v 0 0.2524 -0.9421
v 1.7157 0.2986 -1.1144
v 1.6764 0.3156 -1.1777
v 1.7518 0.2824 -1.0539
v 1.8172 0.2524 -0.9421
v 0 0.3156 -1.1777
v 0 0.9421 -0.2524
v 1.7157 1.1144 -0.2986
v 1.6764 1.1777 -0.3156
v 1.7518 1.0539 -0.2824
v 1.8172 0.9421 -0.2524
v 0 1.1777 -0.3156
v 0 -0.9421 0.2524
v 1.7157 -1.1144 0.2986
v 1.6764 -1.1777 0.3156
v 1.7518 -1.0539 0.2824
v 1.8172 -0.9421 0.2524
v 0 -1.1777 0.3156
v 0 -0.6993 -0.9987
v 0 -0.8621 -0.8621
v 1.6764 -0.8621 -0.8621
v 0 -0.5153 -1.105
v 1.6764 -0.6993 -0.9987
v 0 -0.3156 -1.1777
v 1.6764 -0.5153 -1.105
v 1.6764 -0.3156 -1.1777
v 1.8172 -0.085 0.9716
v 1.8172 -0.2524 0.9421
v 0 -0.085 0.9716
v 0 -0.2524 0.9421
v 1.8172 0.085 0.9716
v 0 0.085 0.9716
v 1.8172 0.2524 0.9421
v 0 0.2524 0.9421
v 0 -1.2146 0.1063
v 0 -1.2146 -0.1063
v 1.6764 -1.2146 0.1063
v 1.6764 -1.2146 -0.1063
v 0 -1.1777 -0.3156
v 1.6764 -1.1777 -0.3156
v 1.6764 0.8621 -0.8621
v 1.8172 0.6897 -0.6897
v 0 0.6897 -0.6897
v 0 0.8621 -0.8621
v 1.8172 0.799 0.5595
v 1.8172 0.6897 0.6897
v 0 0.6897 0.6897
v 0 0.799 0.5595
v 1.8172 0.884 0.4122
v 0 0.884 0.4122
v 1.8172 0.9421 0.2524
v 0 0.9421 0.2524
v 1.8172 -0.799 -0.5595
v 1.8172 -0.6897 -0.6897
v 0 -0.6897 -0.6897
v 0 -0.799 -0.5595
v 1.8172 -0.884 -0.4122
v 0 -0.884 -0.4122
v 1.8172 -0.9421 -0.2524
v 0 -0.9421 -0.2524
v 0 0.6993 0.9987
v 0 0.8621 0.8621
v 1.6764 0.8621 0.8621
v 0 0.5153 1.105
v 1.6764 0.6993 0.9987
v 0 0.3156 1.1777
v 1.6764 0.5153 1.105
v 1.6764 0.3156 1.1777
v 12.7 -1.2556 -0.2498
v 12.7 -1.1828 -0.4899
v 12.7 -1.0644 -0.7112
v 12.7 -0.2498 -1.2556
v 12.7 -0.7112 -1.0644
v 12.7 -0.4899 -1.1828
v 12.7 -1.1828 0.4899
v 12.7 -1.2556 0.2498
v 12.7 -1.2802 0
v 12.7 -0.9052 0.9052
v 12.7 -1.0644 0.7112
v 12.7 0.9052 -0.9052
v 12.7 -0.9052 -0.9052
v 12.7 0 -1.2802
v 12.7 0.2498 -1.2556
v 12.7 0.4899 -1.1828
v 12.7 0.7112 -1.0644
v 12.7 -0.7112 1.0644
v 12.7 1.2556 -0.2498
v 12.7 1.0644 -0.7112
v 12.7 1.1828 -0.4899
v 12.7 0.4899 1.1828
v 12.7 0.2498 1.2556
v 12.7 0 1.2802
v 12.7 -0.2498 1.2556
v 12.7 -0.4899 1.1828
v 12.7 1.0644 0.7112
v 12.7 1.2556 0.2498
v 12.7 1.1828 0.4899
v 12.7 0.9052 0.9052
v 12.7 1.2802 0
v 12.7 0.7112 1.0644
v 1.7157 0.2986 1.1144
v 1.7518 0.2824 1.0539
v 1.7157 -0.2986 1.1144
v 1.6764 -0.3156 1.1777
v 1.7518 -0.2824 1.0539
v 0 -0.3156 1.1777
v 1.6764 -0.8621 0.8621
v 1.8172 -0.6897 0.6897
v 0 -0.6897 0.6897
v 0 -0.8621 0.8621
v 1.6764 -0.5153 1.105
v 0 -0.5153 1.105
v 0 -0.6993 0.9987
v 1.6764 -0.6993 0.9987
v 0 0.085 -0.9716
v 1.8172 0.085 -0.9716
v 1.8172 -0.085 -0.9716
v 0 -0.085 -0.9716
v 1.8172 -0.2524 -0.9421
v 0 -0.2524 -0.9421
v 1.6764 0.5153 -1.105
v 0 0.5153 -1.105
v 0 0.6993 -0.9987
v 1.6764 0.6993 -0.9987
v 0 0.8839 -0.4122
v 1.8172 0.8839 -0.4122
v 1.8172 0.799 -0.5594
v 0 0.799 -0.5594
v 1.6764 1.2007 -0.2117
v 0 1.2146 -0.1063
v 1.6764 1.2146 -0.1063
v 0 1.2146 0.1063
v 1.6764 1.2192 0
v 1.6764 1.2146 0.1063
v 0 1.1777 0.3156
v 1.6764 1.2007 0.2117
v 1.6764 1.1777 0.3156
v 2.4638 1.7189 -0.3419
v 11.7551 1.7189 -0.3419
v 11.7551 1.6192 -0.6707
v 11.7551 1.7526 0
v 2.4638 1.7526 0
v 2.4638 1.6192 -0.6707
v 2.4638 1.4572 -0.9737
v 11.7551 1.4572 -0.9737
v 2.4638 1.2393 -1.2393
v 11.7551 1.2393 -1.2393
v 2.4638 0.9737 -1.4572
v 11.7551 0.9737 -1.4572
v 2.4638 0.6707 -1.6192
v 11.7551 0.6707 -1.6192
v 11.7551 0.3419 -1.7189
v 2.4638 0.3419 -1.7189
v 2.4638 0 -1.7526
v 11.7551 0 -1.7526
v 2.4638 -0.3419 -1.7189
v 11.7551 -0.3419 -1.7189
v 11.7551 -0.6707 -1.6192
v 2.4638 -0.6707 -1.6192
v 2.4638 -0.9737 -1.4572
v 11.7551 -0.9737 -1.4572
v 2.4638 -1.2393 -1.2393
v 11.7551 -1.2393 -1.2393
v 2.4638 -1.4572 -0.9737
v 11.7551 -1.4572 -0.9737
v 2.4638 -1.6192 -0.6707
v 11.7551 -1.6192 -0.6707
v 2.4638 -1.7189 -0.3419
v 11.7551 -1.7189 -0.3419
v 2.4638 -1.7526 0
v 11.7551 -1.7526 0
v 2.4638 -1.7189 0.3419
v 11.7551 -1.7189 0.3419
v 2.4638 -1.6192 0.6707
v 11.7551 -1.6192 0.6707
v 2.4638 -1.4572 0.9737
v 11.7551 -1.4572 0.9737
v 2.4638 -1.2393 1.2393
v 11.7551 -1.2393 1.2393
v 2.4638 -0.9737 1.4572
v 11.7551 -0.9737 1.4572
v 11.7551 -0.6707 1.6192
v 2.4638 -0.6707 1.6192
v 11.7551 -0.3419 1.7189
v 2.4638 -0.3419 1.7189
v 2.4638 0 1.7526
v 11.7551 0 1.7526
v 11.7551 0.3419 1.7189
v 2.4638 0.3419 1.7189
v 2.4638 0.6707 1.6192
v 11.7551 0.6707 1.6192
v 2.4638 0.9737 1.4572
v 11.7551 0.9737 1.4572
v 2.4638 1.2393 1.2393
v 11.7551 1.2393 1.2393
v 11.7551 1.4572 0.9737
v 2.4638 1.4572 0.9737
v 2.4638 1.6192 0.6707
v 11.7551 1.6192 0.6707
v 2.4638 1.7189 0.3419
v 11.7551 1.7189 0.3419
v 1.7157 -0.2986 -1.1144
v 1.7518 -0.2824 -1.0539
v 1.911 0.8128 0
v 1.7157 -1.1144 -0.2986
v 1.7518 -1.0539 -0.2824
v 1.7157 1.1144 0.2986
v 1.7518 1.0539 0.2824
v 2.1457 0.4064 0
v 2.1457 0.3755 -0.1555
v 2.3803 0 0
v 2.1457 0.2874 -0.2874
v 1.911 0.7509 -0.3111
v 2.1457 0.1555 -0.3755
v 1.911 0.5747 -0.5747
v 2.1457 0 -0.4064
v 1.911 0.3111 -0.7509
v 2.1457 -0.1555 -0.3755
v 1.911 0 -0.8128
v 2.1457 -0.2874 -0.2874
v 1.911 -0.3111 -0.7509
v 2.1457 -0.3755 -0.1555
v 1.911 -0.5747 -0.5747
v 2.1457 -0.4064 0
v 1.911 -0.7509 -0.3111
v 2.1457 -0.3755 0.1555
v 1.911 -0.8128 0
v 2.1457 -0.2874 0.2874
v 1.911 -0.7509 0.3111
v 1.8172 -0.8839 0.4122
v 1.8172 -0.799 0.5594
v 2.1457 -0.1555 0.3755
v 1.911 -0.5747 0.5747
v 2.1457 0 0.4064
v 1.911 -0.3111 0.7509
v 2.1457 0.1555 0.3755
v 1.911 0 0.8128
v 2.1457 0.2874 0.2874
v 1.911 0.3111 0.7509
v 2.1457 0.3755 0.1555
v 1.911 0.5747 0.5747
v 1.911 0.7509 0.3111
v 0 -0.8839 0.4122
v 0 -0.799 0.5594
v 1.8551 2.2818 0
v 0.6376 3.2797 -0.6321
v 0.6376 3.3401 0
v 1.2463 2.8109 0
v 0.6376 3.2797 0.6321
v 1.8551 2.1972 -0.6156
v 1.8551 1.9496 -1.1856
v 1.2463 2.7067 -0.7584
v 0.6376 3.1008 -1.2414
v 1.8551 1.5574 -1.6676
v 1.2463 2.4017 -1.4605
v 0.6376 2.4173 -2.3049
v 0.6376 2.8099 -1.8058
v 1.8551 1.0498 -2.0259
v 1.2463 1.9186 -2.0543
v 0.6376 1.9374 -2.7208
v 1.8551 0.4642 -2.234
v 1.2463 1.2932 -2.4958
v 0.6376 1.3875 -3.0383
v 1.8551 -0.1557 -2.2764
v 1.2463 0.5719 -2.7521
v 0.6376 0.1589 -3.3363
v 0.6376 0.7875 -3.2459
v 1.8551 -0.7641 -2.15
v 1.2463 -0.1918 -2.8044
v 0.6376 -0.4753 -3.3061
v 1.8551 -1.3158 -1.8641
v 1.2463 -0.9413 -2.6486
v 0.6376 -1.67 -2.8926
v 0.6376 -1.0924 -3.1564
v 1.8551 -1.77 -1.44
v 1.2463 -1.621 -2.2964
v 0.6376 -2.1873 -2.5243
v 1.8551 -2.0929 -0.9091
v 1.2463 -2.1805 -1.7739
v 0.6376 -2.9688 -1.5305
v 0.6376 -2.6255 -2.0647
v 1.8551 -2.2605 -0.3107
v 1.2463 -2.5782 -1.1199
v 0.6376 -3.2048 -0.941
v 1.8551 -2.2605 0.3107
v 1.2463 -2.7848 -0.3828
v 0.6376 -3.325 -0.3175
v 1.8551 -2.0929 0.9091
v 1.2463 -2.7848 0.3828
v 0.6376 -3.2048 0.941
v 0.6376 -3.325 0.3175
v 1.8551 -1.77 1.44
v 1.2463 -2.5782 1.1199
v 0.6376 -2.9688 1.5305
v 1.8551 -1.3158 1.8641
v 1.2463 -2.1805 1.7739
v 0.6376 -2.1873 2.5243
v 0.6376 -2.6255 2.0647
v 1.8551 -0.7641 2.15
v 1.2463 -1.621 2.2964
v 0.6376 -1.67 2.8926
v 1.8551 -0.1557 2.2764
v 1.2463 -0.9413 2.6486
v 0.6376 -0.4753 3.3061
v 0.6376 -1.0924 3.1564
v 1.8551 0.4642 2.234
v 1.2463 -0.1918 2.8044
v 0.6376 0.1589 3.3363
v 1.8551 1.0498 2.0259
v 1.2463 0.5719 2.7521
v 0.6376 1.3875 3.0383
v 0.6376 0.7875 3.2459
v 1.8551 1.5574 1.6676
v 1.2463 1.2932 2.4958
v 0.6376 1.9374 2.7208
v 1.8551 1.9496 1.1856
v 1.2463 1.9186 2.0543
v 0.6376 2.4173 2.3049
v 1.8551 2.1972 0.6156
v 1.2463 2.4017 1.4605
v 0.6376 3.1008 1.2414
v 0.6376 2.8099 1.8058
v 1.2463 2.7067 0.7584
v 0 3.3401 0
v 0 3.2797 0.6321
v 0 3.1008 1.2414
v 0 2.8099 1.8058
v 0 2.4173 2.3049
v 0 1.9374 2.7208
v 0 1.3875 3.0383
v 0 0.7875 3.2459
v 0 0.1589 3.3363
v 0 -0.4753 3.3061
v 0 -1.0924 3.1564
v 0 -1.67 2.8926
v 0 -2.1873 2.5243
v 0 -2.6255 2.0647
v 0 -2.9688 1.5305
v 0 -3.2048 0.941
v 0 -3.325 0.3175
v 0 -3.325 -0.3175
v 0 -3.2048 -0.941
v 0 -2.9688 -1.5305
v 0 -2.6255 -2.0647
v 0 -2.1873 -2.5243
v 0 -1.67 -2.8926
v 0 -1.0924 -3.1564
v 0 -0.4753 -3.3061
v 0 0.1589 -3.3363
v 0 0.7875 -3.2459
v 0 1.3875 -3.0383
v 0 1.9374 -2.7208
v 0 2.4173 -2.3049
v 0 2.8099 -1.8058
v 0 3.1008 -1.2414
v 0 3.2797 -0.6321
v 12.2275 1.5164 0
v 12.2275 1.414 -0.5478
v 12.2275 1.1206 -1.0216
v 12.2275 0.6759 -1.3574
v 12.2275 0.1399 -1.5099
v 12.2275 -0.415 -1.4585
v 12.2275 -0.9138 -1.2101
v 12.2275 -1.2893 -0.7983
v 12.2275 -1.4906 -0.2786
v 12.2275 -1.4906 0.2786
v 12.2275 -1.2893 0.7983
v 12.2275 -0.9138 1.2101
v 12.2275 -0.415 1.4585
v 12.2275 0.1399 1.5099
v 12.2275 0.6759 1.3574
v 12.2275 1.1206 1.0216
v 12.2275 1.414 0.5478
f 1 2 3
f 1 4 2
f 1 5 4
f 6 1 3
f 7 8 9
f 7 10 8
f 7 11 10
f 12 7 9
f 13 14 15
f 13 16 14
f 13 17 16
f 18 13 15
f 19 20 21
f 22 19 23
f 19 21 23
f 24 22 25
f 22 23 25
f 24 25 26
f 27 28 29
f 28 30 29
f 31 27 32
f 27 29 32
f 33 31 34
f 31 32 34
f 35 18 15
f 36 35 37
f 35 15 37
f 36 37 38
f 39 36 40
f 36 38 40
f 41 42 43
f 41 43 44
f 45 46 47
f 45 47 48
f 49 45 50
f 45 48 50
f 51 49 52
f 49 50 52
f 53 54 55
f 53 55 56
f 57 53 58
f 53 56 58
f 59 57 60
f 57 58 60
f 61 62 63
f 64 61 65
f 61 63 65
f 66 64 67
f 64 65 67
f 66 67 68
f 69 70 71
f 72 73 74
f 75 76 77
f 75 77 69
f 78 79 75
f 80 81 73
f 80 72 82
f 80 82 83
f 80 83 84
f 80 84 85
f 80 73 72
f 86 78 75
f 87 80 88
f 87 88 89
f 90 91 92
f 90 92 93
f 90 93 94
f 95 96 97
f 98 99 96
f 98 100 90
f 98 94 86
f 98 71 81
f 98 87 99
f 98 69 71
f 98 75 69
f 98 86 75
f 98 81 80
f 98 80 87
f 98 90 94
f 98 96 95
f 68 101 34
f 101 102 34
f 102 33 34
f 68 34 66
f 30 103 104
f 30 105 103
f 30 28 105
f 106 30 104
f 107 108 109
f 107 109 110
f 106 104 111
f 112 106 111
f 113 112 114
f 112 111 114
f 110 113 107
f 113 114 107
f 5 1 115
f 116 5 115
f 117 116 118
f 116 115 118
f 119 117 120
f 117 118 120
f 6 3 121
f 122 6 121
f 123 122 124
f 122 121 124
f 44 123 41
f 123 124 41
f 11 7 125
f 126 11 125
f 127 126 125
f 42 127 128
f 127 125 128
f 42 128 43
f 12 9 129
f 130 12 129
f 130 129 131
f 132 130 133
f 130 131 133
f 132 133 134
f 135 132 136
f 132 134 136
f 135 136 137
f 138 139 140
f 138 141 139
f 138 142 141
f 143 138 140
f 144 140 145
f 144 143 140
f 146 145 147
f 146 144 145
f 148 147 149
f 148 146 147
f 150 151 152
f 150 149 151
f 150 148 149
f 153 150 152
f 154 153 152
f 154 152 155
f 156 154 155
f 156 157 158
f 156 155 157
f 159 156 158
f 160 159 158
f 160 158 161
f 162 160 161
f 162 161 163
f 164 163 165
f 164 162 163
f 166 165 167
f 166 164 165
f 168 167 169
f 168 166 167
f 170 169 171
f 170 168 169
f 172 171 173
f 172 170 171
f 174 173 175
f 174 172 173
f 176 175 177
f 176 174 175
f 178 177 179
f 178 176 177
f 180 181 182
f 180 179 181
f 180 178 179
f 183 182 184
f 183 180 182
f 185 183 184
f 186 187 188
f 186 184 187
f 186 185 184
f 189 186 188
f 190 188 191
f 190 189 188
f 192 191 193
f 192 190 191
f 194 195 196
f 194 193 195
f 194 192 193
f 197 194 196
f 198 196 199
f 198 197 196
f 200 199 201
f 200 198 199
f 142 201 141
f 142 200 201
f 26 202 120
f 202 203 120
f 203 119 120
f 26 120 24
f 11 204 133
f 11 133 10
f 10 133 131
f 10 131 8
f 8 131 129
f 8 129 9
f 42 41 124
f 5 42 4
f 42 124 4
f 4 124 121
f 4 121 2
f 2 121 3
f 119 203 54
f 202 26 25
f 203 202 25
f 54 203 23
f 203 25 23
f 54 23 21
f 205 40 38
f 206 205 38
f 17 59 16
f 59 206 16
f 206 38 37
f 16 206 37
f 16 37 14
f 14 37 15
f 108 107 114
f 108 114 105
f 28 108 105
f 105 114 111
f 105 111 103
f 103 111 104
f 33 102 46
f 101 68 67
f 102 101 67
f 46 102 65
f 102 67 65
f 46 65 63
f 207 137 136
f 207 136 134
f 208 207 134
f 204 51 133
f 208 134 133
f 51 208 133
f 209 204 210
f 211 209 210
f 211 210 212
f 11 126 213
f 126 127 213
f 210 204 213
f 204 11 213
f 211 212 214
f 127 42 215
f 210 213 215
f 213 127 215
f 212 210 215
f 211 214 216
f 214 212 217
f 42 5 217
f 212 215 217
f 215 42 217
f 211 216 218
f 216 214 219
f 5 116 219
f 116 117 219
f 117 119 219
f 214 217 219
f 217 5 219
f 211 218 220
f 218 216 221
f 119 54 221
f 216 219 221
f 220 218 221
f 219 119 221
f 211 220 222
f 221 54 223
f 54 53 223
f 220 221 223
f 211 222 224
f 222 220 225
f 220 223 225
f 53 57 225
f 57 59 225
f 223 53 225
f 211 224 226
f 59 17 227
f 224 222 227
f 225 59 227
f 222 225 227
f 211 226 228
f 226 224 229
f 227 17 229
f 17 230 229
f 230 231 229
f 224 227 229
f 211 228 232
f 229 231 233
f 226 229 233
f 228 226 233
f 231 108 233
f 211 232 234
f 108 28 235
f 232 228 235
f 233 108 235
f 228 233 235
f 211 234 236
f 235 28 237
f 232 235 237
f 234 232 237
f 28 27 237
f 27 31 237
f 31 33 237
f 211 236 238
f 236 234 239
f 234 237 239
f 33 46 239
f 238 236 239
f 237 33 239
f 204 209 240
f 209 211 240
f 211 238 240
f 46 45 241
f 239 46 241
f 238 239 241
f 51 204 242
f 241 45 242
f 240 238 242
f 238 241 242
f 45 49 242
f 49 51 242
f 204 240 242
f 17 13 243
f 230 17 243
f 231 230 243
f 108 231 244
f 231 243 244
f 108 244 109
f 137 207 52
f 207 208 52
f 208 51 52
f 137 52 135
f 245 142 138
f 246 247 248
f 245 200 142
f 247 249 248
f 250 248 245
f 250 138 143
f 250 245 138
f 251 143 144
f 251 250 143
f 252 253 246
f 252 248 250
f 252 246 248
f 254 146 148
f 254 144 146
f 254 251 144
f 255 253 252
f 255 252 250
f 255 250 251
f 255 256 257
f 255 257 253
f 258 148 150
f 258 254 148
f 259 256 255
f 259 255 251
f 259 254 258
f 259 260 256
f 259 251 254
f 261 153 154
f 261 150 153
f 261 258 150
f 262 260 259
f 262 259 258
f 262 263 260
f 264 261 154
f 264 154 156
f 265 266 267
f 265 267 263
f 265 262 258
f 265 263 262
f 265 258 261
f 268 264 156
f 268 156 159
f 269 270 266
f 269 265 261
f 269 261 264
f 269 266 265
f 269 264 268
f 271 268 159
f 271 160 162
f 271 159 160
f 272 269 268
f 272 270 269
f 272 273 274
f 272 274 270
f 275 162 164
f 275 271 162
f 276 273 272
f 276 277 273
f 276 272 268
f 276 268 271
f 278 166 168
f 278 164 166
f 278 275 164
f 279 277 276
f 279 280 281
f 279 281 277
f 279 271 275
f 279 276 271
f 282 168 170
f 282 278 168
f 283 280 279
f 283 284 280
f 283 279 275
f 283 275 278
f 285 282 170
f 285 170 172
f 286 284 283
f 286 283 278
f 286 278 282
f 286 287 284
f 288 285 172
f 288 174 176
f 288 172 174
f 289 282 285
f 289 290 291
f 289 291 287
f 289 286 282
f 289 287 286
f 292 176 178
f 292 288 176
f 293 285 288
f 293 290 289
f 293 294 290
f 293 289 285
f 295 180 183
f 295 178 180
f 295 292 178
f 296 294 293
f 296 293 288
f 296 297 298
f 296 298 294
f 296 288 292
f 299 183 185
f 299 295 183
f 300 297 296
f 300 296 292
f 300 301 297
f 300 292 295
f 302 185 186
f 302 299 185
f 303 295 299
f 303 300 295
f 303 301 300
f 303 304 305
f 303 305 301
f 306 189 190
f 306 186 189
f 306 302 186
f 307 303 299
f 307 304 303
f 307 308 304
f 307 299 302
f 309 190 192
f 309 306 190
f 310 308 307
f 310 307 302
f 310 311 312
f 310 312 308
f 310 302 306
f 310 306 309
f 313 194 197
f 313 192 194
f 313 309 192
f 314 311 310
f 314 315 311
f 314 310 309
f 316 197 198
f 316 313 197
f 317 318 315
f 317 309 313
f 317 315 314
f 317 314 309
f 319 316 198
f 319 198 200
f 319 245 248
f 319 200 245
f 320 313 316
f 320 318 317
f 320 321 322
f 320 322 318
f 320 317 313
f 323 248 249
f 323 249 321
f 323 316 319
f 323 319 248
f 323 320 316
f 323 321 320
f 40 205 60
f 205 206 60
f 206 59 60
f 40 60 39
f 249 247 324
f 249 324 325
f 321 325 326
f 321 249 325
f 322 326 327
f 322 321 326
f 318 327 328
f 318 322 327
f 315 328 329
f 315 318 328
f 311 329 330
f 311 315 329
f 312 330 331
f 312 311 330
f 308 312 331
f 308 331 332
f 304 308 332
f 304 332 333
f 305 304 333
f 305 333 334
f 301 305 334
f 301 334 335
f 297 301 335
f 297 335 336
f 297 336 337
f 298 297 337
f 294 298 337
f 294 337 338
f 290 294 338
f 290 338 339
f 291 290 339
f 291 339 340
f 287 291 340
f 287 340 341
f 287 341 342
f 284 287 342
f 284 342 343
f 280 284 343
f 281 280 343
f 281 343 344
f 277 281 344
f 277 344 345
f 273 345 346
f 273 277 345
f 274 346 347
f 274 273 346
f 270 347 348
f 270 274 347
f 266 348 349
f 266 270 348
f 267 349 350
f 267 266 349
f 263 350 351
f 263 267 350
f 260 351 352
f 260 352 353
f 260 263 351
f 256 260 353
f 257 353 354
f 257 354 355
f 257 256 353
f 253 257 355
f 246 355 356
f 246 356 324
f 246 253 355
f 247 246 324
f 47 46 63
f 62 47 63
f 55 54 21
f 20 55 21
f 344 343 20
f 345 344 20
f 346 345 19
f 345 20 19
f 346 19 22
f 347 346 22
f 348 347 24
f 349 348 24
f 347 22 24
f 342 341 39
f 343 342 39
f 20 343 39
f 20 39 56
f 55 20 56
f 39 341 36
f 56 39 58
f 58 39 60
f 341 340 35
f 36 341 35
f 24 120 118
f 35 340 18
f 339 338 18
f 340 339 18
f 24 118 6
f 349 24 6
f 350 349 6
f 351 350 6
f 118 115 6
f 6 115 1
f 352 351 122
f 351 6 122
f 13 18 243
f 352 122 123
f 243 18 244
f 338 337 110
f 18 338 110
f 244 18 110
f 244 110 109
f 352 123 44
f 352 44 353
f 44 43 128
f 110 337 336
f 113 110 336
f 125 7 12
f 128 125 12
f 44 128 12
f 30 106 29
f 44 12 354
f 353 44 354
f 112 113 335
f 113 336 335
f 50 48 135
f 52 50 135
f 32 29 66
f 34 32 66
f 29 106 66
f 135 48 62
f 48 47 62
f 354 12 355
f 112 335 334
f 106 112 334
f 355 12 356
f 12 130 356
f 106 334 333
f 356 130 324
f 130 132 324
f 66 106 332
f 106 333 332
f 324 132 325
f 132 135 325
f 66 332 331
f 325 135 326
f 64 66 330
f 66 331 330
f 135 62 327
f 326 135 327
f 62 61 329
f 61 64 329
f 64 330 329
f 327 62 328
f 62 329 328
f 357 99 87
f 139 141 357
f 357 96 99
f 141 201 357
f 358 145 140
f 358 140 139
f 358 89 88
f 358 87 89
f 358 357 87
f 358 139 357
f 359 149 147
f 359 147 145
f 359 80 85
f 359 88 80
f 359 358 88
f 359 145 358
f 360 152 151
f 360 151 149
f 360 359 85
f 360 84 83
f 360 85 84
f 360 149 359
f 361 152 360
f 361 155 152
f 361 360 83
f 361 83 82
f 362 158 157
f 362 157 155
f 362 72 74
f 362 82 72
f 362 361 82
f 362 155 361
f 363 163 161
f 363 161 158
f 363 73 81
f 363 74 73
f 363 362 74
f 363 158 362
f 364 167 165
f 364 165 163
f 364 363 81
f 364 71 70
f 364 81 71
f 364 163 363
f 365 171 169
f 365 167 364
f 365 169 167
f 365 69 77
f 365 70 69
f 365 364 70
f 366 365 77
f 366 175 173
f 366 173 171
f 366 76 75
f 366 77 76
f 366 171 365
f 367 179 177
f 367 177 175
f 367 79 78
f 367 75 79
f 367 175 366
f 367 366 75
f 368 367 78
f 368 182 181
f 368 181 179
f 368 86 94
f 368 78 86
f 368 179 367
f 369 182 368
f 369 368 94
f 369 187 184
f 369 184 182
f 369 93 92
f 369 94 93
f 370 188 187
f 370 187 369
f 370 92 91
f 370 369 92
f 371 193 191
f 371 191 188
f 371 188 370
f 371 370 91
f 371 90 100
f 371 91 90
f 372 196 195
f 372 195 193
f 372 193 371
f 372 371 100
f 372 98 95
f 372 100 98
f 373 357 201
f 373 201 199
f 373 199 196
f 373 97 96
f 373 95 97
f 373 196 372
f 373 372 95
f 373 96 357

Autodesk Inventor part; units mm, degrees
ref_plane "YZ Plane" through (0, 0, 0) normal (1, 0, 0) x (0, 1, 0)
ref_plane "XZ Plane" through (0, 0, 0) normal (0, 1, 0) x (-1, 0, 0)
sketch "Sketch1" plane through (0, 0, 0) normal (0, 0, 1) x (1, 0, 0)
  line L0 (12.7, 0) -> (12.7, 1.7526)
  line L1 (12.7, 1.7526) -> (2.4638, 1.7526)
  line L2 (0, 3.3401) -> (0, 1.2192)
  line L3 (0, 1.2192) -> (1.6764, 1.2192)
  line L4 (1.6764, 1.2192) -> (2.3803, 0)
  line L5 (2.3803, 0) -> (12.7, 0)
  line L6 (0, 3.3401) -> (0.6376, 3.3401)
  line L7 (0.6376, 3.3401) -> (2.4638, 1.7526)
  line L8 (-2.54, 0) -> (15.24, 0) projected
  line L9 (0, -0.668) -> (0, 4.0081) projected
  dimension "d0" = 12.7
  dimension "d1" = 1.6764
  dimension "d2" = 3.5052
  dimension "d3" = 2.4638
  dimension "d4" = 41
  dimension "d5" = 2.4384
  dimension "d6" = 60
  dimension "d7" = 6.6802
revolve "Body" add sketch "Sketch1" angle 360 about axis through (2.3803, 0, 0) along (1, 0, 0) contours L5 L4 L3 L2 L6 L7 L1 L0
sketch "Sketch2" plane through (0, 0, 0) normal (-1, 0, 0) x (0, 0, 1)
  circle A0 centre (0, 0) radius 3.3401 projected
  circle A1 centre (0, 0) radius 1.2192 projected
  line L0 (0.9421, 0.2524) -> (1.1777, 0.3156)
  line L1 (0.9421, -0.2524) -> (1.1777, -0.3156)
  arc A2 (0.9421, -0.2524) -> (0.9421, 0.2524) centre (0, 0) ccw
  arc A3 (1.1777, -0.3156) -> (1.1777, 0.3156) centre (0, 0) ccw
  line L2 (0, -4.6761) -> (0, 4.6761) projected
  line L3 (-4.6761, 0) -> (4.6761, 0) projected
  line L4 (0.9421, 0.2524) -> (0, 0) construction
  line L5 (0, 0) -> (0.9421, -0.2524) construction
  line L6 (0.2524, 0.9421) -> (0.3156, 1.1777)
  line L7 (0.6897, 0.6897) -> (0.8621, 0.8621)
  arc A4 (0.6897, 0.6897) -> (0.2524, 0.9421) centre (0, 0) ccw
  arc A5 (0.8621, 0.8621) -> (0.3156, 1.1777) centre (0, 0) ccw
  line L8 (-0.6897, 0.6897) -> (-0.8621, 0.8621)
  line L9 (-0.2524, 0.9421) -> (-0.3156, 1.1777)
  arc A6 (-0.2524, 0.9421) -> (-0.6897, 0.6897) centre (0, 0) ccw
  arc A7 (-0.3156, 1.1777) -> (-0.8621, 0.8621) centre (0, 0) ccw
  line L10 (-0.9421, -0.2524) -> (-1.1777, -0.3156)
  line L11 (-0.9421, 0.2524) -> (-1.1777, 0.3156)
  arc A8 (-0.9421, 0.2524) -> (-0.9421, -0.2524) centre (0, 0) ccw
  arc A9 (-1.1777, 0.3156) -> (-1.1777, -0.3156) centre (0, 0) ccw
  line L12 (-0.2524, -0.9421) -> (-0.3156, -1.1777)
  line L13 (-0.6897, -0.6897) -> (-0.8621, -0.8621)
  arc A10 (-0.6897, -0.6897) -> (-0.2524, -0.9421) centre (0, 0) ccw
  arc A11 (-0.8621, -0.8621) -> (-0.3156, -1.1777) centre (0, 0) ccw
  line L14 (0.6897, -0.6897) -> (0.8621, -0.8621)
  line L15 (0.2524, -0.9421) -> (0.3156, -1.1777)
  arc A12 (0.2524, -0.9421) -> (0.6897, -0.6897) centre (0, 0) ccw
  arc A13 (0.3156, -1.1777) -> (0.8621, -0.8621) centre (0, 0) ccw
  dimension "d8" = 1.9507
  dimension "d9" = 2.4384
  dimension "d10" = 15
  dimension "d11" = 15
  dimension "d22" = 360
extrude "Slot" add sketch "Sketch2" against normal up to next contours L3 A2 L0 A1 | A1 L1 A2 L3 | L3 A8 L10 A1 | A1 L11 A8 L3 | A1 L7 A4 L6 | L9 A6 L8 A1 | A1 L13 A10 L12 | L15 A12 L14 A1
thread "Thread" size "6-32 UNC" class "2A" standard "ANSI Unified Screw Threads" length 8.252
chamfer "Chamfer1" distance 0.4724 distance2 0.9449 1 edges at (12.7, -1.7526, 0) measured on face at (12.7, 0.5842, 0.7748)
ref_plane "Work Plane1" through (66.6877, 0, 0) normal (0, 0, -1) x (1, 0, 0)
equation "\"d0\" = NLG"
equation "\"d1\" = INTI"
equation "\"d2\" = GD"
equation "\"d3\" = KOH"
equation "\"d4\" = 0.5 * SEWI"
equation "\"d5\" = SW"
equation "\"d7\" = KOD"
equation "\"d8\" = 0.8 * SW"
equation "\"d9\" = SW"
equation "\"d15\" = GEL"
equation "\"d17\" = -0.5 * SPD + 0.5 * GD"
equation "\"d18\" = GUL"
equation "\"NLG\" = 12.7"
equation "\"SW\" = 2.4384"
equation "\"INTI\" = 1.6764"
equation "\"GEL\" = 8.25195"
equation "\"KOH\" = 2.4638"
equation "\"KOD\" = 6.6802"
equation "\"GUL\" = 0.94488"
equation "\"SPD\" = 2.56032"
equation "\"GD\" = NND"
equation "\"SEWI\" = 82deg"
equation "\"TOA\" = 30deg"
equation "\"GD1\" = SPD"
equation "\"EPV\" = 4.4794"
equation "\"THREADDIA\" = 3.5052"
equation "\"BDM\" = NND"
equation "\"NND\" = 3.5052"
equation "\"GAL\" = 1.9845"
equation "\"E0\" = 1.155 * SW"
properties part number "ANSI B18.3 - 6-32 UNC x 0.5, SSFCHCSI" material "Steel, Mild"
